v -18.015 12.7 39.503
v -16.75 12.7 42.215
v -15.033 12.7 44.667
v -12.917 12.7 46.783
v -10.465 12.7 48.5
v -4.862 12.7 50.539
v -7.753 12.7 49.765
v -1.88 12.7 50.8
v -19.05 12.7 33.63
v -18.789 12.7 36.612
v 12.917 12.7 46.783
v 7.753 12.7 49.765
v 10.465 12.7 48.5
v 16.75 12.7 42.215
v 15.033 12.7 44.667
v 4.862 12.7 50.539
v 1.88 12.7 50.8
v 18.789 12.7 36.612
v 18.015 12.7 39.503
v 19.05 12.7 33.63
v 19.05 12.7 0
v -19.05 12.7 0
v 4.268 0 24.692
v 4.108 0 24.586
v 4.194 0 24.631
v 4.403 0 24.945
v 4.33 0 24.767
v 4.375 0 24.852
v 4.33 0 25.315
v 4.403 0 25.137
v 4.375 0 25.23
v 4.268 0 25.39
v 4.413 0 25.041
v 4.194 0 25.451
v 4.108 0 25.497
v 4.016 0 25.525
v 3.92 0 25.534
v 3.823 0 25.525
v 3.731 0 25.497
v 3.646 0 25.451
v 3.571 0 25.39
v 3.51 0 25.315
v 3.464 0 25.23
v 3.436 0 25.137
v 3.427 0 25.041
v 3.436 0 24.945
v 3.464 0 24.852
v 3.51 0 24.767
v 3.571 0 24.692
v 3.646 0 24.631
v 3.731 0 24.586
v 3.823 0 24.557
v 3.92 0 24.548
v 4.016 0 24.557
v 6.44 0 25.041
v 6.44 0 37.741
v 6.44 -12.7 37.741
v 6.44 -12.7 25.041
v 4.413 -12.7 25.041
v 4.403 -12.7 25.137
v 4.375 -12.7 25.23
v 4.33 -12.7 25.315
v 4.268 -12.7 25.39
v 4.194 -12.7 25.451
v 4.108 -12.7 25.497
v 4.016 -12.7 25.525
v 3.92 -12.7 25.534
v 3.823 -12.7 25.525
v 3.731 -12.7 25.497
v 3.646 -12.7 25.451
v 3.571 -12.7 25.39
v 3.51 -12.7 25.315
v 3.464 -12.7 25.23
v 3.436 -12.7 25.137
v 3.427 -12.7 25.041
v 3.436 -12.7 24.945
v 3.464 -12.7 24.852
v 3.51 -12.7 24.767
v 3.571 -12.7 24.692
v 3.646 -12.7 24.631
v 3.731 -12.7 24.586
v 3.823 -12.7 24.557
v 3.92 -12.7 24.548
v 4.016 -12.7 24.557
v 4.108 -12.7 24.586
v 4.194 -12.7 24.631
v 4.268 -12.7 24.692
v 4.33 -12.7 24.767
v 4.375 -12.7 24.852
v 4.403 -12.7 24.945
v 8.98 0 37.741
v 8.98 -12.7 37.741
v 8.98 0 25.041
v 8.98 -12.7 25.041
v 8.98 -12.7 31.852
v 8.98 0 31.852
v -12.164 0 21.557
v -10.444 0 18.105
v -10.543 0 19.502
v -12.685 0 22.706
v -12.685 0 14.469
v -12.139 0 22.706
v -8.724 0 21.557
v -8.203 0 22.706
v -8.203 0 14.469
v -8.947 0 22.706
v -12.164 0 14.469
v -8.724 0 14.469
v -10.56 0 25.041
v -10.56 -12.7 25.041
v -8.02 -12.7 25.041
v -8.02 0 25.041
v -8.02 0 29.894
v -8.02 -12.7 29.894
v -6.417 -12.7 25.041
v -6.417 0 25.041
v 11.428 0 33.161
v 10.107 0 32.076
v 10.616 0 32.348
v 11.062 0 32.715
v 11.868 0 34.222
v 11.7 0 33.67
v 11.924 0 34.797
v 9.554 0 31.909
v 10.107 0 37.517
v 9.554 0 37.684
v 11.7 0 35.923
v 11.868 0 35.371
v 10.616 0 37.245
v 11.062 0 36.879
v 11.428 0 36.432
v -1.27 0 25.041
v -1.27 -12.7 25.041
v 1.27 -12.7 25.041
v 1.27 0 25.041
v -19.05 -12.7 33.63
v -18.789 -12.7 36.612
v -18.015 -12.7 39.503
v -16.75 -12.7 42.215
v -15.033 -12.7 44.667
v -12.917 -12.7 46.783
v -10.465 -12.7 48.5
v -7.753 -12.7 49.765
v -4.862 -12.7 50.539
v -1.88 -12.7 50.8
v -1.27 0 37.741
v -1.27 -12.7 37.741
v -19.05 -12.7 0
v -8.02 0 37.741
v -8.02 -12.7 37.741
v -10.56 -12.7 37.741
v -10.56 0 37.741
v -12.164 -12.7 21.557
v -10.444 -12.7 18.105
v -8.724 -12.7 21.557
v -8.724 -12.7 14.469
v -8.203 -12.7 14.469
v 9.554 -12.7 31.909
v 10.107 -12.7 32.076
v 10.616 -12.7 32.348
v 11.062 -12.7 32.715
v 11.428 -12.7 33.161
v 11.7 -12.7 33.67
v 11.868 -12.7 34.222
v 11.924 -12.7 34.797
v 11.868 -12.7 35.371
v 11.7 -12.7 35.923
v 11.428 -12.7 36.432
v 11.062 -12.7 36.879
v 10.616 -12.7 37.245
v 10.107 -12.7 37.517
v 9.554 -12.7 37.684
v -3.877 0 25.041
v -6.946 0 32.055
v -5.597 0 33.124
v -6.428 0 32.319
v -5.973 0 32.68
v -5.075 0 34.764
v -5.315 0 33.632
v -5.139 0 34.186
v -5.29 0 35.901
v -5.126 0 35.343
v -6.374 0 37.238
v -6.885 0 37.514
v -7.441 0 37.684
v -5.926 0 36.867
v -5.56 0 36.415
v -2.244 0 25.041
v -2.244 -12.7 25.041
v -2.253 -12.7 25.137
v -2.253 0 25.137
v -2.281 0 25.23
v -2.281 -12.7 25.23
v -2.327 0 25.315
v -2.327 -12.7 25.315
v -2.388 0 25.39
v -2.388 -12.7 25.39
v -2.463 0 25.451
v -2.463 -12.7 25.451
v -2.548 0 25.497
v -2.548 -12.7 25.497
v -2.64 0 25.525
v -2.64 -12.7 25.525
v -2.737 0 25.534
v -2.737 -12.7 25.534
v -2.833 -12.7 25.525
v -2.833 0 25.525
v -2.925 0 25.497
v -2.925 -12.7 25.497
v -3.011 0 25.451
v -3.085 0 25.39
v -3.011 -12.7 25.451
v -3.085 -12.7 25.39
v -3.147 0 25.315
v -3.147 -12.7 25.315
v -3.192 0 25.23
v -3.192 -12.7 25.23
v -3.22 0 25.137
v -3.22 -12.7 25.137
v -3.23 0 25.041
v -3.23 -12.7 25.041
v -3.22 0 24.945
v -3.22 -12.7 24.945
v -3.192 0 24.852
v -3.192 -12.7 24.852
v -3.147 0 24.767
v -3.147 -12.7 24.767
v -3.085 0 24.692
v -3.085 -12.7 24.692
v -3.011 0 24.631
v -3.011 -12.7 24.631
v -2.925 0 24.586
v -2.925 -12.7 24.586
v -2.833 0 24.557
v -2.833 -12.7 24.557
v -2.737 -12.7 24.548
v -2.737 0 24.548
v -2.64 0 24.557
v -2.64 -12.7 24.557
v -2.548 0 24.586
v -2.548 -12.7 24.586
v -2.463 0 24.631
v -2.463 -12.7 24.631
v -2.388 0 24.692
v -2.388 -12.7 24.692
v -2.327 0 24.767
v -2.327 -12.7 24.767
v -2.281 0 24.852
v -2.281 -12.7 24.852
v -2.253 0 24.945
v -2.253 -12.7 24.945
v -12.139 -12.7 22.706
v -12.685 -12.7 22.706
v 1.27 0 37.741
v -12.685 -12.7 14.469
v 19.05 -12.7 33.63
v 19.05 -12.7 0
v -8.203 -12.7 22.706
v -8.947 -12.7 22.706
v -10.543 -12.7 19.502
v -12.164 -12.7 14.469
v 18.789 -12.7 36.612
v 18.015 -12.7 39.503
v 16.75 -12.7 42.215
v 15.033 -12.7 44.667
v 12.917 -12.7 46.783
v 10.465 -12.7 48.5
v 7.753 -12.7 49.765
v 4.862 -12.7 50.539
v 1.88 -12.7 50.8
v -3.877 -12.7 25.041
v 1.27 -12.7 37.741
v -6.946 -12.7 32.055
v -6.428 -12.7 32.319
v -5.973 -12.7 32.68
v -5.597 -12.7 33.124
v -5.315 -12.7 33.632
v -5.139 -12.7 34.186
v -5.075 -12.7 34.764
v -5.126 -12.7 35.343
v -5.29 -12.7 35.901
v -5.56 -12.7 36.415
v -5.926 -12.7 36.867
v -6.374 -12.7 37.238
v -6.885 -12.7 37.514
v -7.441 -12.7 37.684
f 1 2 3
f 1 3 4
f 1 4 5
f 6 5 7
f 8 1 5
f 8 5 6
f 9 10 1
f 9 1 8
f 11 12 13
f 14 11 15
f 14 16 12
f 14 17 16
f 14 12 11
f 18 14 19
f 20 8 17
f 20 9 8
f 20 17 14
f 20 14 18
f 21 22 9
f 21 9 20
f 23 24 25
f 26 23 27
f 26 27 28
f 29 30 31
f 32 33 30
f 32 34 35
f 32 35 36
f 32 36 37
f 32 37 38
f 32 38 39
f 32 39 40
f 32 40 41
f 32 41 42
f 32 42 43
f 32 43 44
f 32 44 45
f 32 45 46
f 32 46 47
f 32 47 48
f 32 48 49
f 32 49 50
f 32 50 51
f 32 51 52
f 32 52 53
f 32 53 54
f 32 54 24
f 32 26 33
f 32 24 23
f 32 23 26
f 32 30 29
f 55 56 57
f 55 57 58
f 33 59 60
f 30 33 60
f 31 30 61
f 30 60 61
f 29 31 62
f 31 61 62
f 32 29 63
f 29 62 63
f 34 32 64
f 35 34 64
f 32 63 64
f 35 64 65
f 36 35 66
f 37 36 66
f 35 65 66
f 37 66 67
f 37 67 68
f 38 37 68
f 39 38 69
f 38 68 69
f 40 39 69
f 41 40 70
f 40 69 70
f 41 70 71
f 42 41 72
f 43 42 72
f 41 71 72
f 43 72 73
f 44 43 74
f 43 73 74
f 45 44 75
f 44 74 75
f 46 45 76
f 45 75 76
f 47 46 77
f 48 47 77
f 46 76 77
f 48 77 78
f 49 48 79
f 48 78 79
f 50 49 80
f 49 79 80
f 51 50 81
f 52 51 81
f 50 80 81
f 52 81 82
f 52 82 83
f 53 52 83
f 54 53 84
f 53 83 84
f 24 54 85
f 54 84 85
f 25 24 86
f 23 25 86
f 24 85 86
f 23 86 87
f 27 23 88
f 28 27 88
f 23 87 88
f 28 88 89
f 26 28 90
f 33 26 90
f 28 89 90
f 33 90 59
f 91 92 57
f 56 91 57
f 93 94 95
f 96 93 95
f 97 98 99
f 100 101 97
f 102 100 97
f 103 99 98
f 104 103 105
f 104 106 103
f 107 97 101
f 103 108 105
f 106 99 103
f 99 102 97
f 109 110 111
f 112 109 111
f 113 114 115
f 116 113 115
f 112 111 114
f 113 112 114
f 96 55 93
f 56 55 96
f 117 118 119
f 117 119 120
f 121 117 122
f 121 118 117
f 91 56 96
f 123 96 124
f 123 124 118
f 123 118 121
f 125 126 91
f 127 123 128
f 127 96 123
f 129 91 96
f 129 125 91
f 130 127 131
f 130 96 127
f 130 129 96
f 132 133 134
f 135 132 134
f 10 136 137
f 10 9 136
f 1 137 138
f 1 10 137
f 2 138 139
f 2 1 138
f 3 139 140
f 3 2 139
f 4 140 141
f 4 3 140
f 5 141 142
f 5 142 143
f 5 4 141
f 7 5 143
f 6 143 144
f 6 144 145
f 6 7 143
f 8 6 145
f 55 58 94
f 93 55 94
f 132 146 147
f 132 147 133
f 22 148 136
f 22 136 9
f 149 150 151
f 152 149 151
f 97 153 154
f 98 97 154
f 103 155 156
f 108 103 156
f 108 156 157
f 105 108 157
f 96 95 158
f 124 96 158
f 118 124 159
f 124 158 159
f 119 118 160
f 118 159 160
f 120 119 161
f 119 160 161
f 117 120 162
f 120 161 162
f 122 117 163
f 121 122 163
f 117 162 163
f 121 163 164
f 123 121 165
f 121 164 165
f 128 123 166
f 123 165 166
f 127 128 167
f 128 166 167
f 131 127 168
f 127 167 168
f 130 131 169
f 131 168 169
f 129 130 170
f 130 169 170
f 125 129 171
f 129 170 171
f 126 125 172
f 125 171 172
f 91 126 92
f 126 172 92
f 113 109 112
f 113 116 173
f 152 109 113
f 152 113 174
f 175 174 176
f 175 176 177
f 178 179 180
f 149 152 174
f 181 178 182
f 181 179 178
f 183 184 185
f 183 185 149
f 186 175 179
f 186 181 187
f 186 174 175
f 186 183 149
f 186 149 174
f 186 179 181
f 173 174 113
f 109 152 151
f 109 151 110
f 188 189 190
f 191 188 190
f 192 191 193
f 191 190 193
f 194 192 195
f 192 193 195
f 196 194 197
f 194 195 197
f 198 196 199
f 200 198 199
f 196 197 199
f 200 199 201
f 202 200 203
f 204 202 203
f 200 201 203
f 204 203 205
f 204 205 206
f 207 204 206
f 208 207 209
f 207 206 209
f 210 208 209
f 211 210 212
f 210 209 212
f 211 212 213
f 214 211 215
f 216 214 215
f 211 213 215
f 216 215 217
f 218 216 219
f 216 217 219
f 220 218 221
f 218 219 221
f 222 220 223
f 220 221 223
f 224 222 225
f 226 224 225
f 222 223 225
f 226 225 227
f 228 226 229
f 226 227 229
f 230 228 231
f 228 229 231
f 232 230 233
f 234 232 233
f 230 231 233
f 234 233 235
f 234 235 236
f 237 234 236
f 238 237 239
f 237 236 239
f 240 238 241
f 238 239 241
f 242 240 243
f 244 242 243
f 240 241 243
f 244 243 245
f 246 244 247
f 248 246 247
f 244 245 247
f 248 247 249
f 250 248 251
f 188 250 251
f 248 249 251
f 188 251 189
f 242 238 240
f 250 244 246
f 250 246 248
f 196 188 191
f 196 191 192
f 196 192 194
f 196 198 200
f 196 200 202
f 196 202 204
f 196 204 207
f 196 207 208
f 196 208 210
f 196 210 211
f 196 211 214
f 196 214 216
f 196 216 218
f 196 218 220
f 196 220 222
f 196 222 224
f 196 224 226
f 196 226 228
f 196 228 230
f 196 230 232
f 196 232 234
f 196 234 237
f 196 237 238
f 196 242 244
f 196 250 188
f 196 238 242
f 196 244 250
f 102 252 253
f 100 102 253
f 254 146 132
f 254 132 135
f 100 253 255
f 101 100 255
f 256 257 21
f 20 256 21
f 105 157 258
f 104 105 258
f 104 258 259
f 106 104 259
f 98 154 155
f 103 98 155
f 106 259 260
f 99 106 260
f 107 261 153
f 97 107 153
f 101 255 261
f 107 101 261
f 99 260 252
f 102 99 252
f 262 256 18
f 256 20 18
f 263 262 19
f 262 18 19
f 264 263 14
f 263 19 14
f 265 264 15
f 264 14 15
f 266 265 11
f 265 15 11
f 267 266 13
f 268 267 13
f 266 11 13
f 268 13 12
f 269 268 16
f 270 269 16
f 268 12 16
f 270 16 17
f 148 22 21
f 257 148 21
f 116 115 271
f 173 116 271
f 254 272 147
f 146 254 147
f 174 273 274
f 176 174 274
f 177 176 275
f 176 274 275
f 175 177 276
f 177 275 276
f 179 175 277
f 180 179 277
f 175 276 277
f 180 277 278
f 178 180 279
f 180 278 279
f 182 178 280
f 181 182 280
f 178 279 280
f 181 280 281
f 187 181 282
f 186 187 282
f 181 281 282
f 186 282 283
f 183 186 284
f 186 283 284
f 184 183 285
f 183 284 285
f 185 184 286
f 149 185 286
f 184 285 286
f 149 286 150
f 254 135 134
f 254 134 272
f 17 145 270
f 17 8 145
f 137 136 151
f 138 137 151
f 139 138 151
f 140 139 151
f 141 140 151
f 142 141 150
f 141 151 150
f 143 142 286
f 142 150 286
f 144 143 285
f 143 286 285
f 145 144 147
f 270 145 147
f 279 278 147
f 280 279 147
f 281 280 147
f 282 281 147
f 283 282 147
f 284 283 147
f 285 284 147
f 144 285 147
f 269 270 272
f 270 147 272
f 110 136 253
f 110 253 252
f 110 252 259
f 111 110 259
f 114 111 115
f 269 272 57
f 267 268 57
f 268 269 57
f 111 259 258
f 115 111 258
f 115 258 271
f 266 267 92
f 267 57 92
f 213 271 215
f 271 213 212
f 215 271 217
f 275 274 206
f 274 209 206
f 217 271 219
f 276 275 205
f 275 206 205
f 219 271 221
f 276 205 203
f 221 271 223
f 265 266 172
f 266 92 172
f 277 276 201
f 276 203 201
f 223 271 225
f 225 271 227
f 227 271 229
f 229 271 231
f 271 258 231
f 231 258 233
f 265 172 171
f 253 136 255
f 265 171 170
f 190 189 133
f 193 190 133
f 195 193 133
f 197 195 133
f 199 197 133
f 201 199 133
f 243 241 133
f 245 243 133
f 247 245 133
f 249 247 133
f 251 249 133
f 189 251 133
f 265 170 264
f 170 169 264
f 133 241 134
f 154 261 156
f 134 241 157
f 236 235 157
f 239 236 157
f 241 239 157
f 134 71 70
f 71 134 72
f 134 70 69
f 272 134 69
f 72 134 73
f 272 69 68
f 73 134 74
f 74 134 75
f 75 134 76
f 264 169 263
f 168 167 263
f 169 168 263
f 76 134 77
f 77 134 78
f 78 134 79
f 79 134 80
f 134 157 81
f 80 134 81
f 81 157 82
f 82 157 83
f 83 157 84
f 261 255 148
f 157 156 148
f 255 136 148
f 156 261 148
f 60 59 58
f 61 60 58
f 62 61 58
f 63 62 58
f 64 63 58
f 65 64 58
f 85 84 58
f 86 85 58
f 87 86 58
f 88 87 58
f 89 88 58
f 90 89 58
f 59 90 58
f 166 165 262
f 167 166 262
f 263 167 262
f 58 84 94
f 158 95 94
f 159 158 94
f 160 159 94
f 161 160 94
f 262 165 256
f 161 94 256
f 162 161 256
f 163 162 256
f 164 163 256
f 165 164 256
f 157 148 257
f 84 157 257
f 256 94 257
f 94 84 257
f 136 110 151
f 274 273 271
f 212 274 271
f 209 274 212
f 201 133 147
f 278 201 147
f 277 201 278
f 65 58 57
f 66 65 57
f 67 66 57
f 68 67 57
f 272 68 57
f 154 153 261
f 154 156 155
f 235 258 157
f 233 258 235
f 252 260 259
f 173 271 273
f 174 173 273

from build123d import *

# Parameters (mm, degrees)
F0_W      = 38.1
F0_H      = 25.4
F1_DEPTH  = 50.8
F2_R      = 17.169887
F4_DEPTH  = 12.7
F7_DEPTH  = 12.7
F9_DEPTH  = 12.7
F10_R     = 0.493061
F11_DEPTH = 12.7
F14_DEPTH = 12.7


with BuildPart() as f1:
    # F0 (on Top) → F1 (new body)
    with BuildSketch(Plane.XY):
        Rectangle(F0_W, F0_H)
    extrude(amount=F1_DEPTH)

    # F2
    f2_edges = [f1.edges().sort_by_distance(p)[0] for p in [
        (19.05, 0, 50.8),
        (-19.05, 0, 50.8),
    ]]
    fillet(f2_edges, radius=F2_R)

    # F3 (on face) → F4 (cut)
    with BuildSketch(Plane.XZ.offset(12.7)):
        Polygon((1.27, 25.041066), (1.27, 37.741066), (-1.27, 37.741066), (-1.27, 25.041066), (0, 25.041066), align=None)
    extrude(amount=-F4_DEPTH, mode=Mode.SUBTRACT)

    # F6 (on face) → F7 (cut)
    with BuildSketch(Plane.XZ.offset(12.7)):
        Polygon((6.439812, 37.741066), (6.439812, 25.041066), (8.979812, 25.041066), (8.979812, 31.852105), (8.979812, 37.741066), align=None)
        with BuildLine():
            ThreePointArc((8.979812, 31.852105), (11.924293, 34.796585), (8.979812, 37.741066))
            Line((8.979812, 37.741066), (8.979812, 31.852105))
        make_face()
    extrude(amount=-F7_DEPTH, mode=Mode.SUBTRACT)

    # F8 (on face) → F9 (cut)
    with BuildSketch(Plane.XZ.offset(12.7)):
        Polygon((-10.559579, 37.741066), (-10.559579, 25.041066), (-8.019579, 25.041066), (-8.019579, 29.893864), (-8.019579, 31.852105), (-8.019579, 37.741066), align=None)
        with BuildLine():
            Line((-8.019579, 31.852105), (-8.019579, 29.893864))
            Line((-8.019579, 29.893864), (-6.416946, 25.041066))
            Line((-6.416946, 25.041066), (-3.876946, 25.041066))
            Line((-3.876946, 25.041066), (-6.945879, 32.054846))
            ThreePointArc((-6.945879, 32.054846), (-7.473242, 31.903234), (-8.019579, 31.852105))
        make_face()
        with BuildLine():
            ThreePointArc((-6.945879, 32.054846), (-5.126227, 35.342922), (-8.019579, 37.741066))
            Line((-8.019579, 37.741066), (-8.019579, 31.852105))
            ThreePointArc((-8.019579, 31.852105), (-7.473242, 31.903234), (-6.945879, 32.054846))
        make_face()
    extrude(amount=-F9_DEPTH, mode=Mode.SUBTRACT)

    # F10 (on face) → F11 (cut)
    with BuildSketch(Plane.XZ.offset(12.7)):
        with Locations((-2.736643, 25.041066)):
            Circle(F10_R)
        with Locations((3.919682, 25.041066)):
            Circle(F10_R)
    extrude(amount=-F11_DEPTH, mode=Mode.SUBTRACT)

    # F13 (on face) → F14 (cut)
    with BuildSketch(Plane.XZ.offset(12.7)):
        Polygon((-12.685429, 22.705782), (-12.685429, 14.469298), (-12.164247, 14.469298), (-12.164247, 21.557376), (-10.444346, 18.105285), (-8.724445, 21.557376), (-8.724445, 14.469298), (-8.203262, 14.469298), (-8.203262, 22.705782), (-8.946966, 22.705782), (-10.543204, 19.501902), (-12.139441, 22.705782), align=None)
    extrude(amount=-F14_DEPTH, mode=Mode.SUBTRACT)


solid = f1.part
